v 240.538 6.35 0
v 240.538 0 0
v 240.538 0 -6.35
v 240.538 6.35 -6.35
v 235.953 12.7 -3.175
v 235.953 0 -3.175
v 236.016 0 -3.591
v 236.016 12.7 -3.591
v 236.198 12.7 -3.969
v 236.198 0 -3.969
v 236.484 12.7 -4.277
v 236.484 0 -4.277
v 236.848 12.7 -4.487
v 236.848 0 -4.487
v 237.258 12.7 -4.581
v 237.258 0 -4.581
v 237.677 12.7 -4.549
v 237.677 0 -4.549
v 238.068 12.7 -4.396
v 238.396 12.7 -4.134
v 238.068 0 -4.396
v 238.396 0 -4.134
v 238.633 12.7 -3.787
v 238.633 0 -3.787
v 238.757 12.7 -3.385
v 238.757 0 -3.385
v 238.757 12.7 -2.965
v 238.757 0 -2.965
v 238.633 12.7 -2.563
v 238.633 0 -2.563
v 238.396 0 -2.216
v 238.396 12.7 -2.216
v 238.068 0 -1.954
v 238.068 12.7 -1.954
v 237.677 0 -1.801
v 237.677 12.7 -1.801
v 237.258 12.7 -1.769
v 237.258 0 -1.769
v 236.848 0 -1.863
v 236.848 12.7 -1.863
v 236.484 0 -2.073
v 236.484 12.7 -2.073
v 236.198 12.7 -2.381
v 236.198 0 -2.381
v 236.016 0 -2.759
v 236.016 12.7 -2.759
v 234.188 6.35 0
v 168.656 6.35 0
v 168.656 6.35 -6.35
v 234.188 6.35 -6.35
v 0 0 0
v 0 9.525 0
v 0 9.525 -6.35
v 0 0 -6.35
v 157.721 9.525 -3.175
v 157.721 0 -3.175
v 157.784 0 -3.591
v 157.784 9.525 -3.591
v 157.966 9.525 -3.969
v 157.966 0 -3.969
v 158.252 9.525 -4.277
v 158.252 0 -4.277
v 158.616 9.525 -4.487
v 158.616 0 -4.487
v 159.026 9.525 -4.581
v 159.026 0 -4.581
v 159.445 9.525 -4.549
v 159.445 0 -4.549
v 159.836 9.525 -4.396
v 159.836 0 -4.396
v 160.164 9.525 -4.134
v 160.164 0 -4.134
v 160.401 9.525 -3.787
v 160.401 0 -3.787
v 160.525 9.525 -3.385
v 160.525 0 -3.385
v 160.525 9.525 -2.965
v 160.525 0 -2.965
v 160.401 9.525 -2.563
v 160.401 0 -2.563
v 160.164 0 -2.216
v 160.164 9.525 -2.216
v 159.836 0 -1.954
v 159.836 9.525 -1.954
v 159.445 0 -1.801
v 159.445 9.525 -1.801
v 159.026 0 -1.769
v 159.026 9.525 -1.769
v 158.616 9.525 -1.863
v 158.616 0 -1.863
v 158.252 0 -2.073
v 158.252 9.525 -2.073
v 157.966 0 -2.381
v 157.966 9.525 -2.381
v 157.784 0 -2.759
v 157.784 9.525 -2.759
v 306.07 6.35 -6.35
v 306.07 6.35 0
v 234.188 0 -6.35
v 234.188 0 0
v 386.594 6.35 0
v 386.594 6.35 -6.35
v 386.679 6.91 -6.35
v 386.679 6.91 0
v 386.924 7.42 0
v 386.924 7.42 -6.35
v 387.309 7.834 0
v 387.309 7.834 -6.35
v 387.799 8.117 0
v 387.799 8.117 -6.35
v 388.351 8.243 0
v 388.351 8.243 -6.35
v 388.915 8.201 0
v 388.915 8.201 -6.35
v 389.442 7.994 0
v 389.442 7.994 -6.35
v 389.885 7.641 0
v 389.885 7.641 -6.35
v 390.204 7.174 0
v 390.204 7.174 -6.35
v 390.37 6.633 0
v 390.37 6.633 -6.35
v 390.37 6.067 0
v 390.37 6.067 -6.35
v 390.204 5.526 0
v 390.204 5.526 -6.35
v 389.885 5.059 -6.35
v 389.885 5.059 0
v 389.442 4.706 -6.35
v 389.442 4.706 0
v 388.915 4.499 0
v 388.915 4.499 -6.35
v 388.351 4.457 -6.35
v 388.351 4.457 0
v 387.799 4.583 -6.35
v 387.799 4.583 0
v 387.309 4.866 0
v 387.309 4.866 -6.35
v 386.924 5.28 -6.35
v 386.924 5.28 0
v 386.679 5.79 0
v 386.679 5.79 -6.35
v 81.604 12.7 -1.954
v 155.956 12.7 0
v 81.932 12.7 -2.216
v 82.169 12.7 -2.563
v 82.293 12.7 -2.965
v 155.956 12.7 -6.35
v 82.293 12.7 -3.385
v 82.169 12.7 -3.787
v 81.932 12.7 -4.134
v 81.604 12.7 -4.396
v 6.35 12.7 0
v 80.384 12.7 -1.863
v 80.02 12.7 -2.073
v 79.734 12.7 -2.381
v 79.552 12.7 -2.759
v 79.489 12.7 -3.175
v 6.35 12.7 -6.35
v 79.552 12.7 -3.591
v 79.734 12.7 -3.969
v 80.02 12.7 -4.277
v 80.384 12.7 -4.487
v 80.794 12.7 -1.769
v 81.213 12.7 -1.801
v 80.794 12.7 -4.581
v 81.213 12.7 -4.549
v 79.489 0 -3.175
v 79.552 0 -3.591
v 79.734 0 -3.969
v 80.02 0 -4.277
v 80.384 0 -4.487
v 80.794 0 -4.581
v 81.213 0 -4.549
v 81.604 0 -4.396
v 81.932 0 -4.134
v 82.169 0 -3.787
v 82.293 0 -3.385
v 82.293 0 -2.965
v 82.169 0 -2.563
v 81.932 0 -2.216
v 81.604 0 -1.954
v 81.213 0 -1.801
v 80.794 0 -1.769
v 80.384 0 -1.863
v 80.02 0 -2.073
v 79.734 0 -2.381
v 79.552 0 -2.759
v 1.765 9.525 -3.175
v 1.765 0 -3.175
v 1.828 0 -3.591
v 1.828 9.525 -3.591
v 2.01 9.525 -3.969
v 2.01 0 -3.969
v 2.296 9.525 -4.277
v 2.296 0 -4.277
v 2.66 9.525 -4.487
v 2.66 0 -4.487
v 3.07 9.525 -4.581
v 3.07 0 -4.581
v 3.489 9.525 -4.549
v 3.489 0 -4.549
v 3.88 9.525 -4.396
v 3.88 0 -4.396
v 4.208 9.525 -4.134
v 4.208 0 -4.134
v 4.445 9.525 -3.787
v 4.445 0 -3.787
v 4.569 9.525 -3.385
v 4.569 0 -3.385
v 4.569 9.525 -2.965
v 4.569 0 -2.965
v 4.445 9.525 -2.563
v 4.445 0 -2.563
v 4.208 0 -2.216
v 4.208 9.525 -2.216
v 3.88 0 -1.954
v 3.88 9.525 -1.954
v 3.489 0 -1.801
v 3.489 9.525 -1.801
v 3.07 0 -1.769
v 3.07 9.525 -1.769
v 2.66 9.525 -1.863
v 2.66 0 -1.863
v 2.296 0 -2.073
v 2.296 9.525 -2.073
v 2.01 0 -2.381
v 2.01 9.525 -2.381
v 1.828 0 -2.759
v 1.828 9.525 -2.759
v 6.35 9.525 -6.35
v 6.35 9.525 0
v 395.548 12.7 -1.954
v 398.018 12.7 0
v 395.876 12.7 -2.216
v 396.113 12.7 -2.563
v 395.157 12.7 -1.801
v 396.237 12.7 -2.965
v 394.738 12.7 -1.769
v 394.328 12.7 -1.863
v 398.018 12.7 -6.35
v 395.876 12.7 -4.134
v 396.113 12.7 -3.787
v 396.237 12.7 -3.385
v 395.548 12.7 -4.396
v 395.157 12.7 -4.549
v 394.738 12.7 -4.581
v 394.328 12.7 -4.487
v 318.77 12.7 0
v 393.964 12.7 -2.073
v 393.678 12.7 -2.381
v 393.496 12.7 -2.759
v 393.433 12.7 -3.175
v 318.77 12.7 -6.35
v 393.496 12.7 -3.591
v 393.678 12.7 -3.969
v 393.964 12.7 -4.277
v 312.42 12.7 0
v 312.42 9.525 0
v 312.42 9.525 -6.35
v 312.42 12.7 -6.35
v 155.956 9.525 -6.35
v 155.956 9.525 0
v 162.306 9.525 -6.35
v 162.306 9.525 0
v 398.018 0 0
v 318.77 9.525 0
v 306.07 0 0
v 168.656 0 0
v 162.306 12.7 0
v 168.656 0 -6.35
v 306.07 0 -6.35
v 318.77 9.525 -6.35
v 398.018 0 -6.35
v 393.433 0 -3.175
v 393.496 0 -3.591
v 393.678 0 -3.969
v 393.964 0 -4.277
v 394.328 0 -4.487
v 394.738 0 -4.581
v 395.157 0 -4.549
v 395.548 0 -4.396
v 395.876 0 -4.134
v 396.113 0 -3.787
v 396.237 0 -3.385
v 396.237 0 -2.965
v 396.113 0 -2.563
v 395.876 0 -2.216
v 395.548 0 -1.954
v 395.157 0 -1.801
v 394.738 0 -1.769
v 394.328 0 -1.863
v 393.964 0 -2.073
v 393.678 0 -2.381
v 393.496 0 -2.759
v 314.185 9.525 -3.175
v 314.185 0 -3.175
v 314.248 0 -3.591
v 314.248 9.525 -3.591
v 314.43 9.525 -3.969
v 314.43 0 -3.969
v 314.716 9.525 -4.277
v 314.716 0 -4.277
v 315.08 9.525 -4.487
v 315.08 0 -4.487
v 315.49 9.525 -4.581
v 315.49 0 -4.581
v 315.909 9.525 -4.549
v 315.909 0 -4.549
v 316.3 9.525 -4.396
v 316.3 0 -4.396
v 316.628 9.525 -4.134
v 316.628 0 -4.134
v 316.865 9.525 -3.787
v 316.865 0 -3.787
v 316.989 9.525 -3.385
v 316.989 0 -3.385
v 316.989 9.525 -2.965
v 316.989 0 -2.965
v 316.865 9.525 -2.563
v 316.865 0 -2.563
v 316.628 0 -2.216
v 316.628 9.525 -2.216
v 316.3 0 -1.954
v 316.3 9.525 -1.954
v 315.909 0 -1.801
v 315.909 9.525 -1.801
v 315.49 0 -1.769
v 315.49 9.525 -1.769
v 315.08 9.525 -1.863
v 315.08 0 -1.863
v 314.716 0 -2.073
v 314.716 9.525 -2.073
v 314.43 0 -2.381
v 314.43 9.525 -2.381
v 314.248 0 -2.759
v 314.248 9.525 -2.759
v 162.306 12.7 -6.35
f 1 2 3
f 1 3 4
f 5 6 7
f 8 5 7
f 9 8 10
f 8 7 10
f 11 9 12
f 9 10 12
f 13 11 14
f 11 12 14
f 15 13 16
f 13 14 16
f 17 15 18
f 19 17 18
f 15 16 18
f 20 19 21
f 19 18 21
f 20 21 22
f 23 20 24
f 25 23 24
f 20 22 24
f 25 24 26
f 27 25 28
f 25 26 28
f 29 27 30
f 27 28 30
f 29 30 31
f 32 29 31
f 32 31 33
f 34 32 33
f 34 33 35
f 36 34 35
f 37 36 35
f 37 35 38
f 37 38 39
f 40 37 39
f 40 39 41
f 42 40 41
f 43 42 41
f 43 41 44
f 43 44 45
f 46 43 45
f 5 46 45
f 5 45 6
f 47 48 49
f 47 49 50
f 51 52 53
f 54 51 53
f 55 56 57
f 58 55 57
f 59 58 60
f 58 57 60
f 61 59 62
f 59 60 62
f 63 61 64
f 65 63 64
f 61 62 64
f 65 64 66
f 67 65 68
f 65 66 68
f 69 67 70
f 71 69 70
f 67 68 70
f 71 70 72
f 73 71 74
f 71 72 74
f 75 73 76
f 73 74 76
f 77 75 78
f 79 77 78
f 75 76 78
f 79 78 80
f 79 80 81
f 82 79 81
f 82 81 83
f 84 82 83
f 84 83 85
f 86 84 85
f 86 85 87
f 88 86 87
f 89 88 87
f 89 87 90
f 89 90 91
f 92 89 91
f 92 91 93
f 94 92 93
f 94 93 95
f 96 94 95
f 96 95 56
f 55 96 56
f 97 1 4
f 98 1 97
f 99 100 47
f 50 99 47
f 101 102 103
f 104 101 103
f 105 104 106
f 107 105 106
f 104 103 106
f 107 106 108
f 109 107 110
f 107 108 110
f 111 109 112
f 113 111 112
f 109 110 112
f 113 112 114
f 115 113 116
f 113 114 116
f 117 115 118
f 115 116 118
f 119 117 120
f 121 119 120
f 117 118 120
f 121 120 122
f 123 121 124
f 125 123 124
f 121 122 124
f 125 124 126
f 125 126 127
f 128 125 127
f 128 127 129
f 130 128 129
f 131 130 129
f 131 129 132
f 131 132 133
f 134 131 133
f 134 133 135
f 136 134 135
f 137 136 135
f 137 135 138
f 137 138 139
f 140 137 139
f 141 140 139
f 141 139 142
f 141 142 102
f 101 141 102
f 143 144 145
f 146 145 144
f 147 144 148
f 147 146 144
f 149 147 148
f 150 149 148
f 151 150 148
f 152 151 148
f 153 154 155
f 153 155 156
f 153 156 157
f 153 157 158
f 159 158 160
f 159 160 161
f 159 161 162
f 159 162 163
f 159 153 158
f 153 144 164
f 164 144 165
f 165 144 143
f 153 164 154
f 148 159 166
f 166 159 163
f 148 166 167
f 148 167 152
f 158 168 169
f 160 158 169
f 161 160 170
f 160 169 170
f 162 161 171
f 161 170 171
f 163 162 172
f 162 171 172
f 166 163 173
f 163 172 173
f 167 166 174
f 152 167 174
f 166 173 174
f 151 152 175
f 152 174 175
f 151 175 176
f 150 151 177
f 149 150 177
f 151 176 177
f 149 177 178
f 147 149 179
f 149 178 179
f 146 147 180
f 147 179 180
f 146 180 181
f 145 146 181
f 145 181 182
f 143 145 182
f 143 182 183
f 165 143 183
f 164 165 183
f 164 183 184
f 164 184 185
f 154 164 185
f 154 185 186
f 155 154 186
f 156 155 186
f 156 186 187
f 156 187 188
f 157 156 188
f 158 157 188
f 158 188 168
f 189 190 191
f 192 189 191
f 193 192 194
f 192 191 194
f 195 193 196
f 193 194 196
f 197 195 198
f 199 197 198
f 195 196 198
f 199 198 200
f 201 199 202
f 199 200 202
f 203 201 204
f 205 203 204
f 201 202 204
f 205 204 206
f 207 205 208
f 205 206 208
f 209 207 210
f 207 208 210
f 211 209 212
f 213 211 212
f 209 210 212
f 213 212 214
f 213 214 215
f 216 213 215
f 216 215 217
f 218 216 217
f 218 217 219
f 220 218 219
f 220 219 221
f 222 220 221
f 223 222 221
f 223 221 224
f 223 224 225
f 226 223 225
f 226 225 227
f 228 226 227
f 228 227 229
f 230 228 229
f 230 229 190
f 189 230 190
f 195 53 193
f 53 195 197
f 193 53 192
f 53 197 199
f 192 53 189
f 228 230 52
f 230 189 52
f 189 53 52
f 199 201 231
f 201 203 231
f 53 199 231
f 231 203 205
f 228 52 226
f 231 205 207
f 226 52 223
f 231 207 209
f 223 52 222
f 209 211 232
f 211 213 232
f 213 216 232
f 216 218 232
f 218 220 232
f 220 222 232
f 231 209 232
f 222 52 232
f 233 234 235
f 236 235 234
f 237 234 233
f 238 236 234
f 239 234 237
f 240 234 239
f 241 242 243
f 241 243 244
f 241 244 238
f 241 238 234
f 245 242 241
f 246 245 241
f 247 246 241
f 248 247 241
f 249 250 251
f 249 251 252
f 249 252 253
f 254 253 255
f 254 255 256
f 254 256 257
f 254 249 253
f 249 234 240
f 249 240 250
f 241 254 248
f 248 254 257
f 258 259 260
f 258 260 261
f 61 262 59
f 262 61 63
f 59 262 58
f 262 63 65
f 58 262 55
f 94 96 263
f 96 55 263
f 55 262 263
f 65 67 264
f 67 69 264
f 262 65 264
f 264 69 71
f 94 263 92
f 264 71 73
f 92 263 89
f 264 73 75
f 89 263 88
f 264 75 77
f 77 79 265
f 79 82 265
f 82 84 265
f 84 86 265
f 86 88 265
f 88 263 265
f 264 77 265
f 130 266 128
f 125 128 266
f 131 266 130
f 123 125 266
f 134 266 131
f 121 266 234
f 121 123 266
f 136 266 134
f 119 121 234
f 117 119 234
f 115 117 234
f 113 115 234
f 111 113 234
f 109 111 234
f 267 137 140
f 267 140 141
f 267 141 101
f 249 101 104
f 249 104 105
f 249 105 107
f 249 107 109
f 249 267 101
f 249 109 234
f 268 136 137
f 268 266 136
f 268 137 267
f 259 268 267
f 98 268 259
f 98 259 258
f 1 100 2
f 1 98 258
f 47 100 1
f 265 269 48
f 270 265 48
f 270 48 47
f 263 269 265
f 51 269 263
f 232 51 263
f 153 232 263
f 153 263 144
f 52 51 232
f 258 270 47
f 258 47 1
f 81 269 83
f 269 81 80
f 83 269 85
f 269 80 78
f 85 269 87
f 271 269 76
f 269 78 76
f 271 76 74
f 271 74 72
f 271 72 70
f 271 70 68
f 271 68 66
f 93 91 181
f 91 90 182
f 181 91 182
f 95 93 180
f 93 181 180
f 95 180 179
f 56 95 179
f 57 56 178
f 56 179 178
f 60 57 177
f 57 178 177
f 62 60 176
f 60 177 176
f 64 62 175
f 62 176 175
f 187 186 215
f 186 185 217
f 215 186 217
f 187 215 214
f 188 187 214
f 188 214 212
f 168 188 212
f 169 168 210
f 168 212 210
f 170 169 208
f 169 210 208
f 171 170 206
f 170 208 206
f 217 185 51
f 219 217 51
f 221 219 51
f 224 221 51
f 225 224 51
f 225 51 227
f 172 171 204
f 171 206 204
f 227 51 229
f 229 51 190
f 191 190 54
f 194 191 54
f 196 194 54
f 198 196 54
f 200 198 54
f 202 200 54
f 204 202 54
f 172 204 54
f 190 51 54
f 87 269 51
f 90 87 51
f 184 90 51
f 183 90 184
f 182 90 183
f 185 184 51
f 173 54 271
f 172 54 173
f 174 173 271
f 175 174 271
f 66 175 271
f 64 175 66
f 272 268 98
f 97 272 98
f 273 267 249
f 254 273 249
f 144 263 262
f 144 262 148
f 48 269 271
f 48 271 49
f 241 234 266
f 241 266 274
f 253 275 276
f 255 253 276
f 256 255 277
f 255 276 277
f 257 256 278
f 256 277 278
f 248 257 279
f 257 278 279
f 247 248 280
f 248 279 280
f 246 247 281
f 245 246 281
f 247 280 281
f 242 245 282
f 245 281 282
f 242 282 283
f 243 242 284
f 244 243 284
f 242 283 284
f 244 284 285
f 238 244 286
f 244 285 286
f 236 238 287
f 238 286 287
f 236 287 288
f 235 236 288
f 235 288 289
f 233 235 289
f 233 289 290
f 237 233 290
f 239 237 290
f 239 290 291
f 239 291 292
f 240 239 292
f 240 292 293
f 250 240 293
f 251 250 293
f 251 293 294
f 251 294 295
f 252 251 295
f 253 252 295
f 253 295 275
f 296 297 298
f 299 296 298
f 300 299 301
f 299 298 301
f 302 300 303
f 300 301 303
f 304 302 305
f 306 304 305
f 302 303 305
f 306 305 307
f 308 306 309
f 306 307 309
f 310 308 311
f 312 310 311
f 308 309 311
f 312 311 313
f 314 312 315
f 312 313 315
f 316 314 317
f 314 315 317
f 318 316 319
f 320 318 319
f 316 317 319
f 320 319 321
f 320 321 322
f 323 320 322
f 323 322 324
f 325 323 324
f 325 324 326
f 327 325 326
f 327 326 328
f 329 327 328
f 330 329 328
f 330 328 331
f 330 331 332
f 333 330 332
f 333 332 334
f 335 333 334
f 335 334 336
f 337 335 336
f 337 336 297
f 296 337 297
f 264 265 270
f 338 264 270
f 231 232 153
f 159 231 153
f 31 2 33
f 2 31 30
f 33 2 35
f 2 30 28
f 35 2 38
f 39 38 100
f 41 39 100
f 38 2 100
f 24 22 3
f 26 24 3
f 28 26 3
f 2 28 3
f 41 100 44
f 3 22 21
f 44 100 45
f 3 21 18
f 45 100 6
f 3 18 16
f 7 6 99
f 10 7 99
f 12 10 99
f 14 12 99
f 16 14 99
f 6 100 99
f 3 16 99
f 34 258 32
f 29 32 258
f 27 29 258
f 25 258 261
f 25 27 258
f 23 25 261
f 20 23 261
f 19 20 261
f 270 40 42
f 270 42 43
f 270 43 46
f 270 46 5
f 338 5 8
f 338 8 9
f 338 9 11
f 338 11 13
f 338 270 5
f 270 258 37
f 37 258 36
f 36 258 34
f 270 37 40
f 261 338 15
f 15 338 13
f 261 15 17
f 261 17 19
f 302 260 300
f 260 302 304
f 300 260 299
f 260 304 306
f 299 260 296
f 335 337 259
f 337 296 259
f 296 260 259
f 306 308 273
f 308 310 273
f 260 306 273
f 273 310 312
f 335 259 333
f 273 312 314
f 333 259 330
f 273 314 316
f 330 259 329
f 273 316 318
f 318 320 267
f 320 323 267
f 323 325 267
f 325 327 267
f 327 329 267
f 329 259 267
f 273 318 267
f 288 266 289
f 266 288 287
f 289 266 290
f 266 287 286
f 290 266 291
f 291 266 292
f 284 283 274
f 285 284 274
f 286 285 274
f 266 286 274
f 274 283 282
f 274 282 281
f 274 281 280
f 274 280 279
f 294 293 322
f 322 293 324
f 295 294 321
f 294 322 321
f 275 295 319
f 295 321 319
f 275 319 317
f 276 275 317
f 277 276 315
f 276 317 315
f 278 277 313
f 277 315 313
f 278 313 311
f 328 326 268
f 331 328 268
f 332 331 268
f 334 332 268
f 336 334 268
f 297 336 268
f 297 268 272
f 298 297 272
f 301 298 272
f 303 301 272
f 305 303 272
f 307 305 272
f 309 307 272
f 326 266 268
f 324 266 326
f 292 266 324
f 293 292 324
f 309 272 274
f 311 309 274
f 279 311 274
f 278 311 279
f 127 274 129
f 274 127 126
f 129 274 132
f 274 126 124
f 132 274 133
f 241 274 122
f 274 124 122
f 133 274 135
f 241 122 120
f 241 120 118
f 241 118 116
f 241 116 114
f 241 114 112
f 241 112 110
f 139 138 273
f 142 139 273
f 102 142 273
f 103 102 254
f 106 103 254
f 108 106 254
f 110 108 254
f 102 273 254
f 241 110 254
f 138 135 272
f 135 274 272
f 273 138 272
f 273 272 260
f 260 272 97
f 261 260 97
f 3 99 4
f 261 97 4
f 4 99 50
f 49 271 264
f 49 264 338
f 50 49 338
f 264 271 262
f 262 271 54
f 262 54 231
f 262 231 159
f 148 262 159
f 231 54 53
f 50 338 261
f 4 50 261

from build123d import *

# Parameters (mm, degrees)
SKETCH1_W                   = 6.35
SKETCH1_H                   = 12.7
BOSS_EXTRUDE1_DEPTH         = 398.018
F_34_0_111_DIAMETER_HOLE1_D = 2.8194
SKETCH6_W                   = 6.35
SKETCH6_H                   = 6.35
CUT_EXTRUDE1_DEPTH          = 7.35
TAP_DRILL_FOR_10_24_TAP1_D  = 3.7973
SKETCH9_W                   = 65.532
SKETCH9_H                   = 6.35
CUT_EXTRUDE3_DEPTH          = 7.35


with BuildPart() as part:
    # Sketch1 → Boss-Extrude1 (new body)
    with BuildSketch(Plane(origin=(0, 0, 0), x_dir=(0, 0, -1), z_dir=(1, 0, 0))):
        with Locations((3.175, 6.35)):
            Rectangle(SKETCH1_W, SKETCH1_H)
    extrude(amount=BOSS_EXTRUDE1_DEPTH)

    # #34 (0.111) Diameter Hole1 (through all)
    with Locations(Plane(origin=(0, 12.7, 0), x_dir=(1, 0, 0), z_dir=(0, 1, 0))):
        with Locations((3.175, 3.175), (159.131, 3.175), (80.899, 3.175), (237.363, 3.175), (315.595, 3.175), (394.843, 3.175)):
            Hole(F_34_0_111_DIAMETER_HOLE1_D / 2)

    # Sketch6 → Cut-Extrude1 (cut, through all)
    with BuildSketch(Plane.XY):
        with Locations((315.595, 12.7)):
            Rectangle(SKETCH6_W, SKETCH6_H)
        with Locations((159.131, 12.7)):
            Rectangle(SKETCH6_W, SKETCH6_H)
        with Locations((3.175, 12.7)):
            Rectangle(SKETCH6_W, SKETCH6_H)
    extrude(amount=-CUT_EXTRUDE1_DEPTH, mode=Mode.SUBTRACT)

    # Tap Drill for #10-24 Tap1 (through all)
    with Locations(Plane.XY):
        with Locations((388.493, 6.35)):
            Hole(TAP_DRILL_FOR_10_24_TAP1_D / 2)

    # Sketch9 → Cut-Extrude3 (cut, through all)
    with BuildSketch(Plane.XY):
        with Locations((201.422, 3.175)):
            Rectangle(SKETCH9_W, SKETCH9_H)
        with Locations((273.304, 3.175)):
            Rectangle(SKETCH9_W, SKETCH9_H)
    extrude(amount=-CUT_EXTRUDE3_DEPTH, mode=Mode.SUBTRACT)


solid = part.part
